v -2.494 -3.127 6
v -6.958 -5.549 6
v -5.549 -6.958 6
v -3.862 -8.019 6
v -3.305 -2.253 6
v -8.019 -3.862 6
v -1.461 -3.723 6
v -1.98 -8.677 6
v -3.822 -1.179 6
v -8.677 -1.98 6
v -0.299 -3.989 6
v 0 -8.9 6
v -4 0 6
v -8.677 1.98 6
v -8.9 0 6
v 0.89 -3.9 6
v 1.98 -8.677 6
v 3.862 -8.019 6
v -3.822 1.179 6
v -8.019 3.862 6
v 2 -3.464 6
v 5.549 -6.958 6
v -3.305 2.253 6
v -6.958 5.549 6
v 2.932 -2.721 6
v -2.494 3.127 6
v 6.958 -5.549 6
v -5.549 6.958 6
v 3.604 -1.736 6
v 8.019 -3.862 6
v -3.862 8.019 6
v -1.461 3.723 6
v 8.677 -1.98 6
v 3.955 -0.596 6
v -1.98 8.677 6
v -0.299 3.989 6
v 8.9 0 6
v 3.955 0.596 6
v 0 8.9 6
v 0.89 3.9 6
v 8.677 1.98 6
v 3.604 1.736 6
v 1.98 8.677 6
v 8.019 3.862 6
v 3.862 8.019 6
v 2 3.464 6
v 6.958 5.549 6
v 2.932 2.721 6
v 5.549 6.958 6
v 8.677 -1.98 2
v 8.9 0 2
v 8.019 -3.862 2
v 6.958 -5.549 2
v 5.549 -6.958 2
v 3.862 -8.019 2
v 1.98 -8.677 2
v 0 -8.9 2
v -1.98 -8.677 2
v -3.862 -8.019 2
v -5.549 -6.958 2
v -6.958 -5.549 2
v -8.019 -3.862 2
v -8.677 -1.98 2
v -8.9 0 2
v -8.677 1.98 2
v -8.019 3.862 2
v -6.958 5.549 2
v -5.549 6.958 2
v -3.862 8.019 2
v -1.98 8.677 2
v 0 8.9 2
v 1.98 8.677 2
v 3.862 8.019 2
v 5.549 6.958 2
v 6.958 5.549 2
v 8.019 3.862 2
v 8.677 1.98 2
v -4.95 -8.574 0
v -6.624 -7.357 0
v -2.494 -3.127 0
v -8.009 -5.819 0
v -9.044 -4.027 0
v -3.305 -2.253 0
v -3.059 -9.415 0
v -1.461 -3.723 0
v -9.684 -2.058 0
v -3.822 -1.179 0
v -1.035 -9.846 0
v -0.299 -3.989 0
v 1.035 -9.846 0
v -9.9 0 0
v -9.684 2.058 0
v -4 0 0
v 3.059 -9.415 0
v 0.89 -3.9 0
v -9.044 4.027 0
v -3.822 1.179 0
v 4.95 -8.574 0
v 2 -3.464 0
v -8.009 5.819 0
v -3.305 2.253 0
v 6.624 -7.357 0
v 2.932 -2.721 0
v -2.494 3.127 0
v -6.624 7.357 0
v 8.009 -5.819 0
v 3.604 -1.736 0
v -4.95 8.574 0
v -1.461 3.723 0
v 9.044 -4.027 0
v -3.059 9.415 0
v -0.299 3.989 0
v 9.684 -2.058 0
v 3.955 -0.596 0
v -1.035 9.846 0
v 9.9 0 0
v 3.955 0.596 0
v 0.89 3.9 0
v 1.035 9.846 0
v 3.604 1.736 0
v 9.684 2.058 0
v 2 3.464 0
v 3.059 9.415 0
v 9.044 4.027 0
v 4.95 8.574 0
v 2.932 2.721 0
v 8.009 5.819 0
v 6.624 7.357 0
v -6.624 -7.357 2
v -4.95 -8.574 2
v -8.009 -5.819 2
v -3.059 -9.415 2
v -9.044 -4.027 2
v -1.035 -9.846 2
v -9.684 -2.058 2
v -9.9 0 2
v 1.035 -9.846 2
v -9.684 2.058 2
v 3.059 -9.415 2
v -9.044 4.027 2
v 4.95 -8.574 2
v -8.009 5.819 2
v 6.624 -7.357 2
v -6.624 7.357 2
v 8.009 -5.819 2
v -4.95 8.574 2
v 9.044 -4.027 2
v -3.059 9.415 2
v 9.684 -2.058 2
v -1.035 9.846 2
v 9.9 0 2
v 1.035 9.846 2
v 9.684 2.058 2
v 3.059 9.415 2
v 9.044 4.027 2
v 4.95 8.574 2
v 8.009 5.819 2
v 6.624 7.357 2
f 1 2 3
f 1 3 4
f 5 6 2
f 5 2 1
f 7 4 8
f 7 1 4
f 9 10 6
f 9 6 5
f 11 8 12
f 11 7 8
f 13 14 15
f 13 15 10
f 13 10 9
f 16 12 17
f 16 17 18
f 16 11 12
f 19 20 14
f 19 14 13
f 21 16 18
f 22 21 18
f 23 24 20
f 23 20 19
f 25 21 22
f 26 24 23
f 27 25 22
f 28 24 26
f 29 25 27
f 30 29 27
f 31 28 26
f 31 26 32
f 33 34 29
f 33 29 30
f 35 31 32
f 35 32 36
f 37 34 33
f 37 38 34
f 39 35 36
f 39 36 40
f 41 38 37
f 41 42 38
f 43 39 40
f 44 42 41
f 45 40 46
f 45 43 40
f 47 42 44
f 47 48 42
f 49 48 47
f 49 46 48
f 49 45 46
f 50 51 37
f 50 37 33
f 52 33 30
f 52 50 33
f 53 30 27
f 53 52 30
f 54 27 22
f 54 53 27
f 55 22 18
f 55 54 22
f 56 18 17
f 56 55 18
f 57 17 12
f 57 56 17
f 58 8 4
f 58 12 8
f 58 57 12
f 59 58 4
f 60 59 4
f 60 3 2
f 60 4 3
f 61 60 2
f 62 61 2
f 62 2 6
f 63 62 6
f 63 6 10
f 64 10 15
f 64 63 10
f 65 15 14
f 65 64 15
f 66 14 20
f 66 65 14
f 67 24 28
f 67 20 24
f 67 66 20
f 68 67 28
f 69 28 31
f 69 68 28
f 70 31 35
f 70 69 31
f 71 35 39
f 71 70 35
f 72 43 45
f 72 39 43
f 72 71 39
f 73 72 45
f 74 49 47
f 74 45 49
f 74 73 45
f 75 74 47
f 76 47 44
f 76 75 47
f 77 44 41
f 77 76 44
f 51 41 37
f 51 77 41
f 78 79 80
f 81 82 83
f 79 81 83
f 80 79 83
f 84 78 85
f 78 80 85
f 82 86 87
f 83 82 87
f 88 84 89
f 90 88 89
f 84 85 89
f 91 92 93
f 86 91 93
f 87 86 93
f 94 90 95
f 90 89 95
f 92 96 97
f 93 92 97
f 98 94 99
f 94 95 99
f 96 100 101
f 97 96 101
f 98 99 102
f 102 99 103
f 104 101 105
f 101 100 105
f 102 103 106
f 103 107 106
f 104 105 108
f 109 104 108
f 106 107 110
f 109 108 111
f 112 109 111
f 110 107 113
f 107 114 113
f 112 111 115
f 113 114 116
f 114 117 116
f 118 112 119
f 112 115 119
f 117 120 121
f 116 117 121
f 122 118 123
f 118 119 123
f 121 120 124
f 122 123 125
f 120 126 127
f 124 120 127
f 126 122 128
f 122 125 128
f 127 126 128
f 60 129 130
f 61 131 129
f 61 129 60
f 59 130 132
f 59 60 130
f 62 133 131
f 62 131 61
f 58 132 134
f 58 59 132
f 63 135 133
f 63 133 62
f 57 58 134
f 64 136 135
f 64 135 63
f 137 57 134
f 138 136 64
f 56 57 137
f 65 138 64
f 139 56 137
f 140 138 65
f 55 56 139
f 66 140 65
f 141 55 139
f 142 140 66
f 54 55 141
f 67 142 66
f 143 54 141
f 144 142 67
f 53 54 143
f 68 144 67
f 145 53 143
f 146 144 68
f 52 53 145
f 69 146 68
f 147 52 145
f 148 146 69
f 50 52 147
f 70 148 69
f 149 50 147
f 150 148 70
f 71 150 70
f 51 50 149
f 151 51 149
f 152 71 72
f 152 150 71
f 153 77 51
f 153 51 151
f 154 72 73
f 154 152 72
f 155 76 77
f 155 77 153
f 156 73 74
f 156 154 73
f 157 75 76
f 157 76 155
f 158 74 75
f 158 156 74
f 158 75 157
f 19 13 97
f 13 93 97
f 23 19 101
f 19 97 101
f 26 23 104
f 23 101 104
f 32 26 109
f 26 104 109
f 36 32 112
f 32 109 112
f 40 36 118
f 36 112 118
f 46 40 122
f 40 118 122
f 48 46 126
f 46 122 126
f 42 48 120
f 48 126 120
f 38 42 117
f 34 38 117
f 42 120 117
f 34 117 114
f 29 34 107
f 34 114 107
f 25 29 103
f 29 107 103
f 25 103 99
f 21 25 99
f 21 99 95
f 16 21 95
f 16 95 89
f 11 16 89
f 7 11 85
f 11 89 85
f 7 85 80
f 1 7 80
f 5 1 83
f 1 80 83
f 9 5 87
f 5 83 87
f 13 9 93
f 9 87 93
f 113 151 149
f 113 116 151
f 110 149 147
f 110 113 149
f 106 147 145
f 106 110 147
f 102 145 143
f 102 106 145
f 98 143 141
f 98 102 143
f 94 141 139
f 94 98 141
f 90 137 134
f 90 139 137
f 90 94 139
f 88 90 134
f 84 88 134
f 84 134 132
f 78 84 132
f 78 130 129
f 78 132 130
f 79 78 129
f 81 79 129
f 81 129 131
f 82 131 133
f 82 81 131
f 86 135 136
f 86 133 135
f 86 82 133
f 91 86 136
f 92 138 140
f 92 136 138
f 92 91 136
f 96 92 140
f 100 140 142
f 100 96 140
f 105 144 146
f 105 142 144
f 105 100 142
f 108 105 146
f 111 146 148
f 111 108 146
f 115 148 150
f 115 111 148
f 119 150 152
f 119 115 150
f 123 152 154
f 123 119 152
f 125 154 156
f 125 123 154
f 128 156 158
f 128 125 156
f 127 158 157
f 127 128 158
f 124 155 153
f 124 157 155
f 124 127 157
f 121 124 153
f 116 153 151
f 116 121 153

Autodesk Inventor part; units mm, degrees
ref_plane "YZ Plane" through (0, 0, 0) normal (1, 0, 0) x (0, 1, 0)
ref_plane "XZ Plane" through (0, 0, 0) normal (0, 1, 0) x (-1, 0, 0)
ref_plane "XY Plane" through (0, 0, 0) normal (0, 0, 1) x (1, 0, 0)
sketch "Sketch1" plane through (0, 0, 0) normal (0, 0, 1) x (1, 0, 0)
  circle A0 centre (0, 0) radius 9.9
  dimension "d0" = 19.8
extrude "Extrusion1" add sketch "Sketch1" along normal blind 2
sketch "Sketch2" plane through (0, 0, 2) normal (0, 0, 1) x (1, 0, 0)
  circle A0 centre (0, 0) radius 8.9
  dimension "d3" = 17.8
extrude "Extrusion2" add sketch "Sketch2" along normal blind 4
thread "Thread1" size "M18x2.5" class "6g" standard "ANSI Metric M Profile" length 10
sketch "Sketch3" plane through (0, 0, 0) normal (0, 0, -1) x (-1, 0, 0)
  circle A0 centre (0, 0) radius 4
  dimension "d8" = 8
extrude "Extrusion3" cut sketch "Sketch3" against normal blind 10
properties part number "punta"
